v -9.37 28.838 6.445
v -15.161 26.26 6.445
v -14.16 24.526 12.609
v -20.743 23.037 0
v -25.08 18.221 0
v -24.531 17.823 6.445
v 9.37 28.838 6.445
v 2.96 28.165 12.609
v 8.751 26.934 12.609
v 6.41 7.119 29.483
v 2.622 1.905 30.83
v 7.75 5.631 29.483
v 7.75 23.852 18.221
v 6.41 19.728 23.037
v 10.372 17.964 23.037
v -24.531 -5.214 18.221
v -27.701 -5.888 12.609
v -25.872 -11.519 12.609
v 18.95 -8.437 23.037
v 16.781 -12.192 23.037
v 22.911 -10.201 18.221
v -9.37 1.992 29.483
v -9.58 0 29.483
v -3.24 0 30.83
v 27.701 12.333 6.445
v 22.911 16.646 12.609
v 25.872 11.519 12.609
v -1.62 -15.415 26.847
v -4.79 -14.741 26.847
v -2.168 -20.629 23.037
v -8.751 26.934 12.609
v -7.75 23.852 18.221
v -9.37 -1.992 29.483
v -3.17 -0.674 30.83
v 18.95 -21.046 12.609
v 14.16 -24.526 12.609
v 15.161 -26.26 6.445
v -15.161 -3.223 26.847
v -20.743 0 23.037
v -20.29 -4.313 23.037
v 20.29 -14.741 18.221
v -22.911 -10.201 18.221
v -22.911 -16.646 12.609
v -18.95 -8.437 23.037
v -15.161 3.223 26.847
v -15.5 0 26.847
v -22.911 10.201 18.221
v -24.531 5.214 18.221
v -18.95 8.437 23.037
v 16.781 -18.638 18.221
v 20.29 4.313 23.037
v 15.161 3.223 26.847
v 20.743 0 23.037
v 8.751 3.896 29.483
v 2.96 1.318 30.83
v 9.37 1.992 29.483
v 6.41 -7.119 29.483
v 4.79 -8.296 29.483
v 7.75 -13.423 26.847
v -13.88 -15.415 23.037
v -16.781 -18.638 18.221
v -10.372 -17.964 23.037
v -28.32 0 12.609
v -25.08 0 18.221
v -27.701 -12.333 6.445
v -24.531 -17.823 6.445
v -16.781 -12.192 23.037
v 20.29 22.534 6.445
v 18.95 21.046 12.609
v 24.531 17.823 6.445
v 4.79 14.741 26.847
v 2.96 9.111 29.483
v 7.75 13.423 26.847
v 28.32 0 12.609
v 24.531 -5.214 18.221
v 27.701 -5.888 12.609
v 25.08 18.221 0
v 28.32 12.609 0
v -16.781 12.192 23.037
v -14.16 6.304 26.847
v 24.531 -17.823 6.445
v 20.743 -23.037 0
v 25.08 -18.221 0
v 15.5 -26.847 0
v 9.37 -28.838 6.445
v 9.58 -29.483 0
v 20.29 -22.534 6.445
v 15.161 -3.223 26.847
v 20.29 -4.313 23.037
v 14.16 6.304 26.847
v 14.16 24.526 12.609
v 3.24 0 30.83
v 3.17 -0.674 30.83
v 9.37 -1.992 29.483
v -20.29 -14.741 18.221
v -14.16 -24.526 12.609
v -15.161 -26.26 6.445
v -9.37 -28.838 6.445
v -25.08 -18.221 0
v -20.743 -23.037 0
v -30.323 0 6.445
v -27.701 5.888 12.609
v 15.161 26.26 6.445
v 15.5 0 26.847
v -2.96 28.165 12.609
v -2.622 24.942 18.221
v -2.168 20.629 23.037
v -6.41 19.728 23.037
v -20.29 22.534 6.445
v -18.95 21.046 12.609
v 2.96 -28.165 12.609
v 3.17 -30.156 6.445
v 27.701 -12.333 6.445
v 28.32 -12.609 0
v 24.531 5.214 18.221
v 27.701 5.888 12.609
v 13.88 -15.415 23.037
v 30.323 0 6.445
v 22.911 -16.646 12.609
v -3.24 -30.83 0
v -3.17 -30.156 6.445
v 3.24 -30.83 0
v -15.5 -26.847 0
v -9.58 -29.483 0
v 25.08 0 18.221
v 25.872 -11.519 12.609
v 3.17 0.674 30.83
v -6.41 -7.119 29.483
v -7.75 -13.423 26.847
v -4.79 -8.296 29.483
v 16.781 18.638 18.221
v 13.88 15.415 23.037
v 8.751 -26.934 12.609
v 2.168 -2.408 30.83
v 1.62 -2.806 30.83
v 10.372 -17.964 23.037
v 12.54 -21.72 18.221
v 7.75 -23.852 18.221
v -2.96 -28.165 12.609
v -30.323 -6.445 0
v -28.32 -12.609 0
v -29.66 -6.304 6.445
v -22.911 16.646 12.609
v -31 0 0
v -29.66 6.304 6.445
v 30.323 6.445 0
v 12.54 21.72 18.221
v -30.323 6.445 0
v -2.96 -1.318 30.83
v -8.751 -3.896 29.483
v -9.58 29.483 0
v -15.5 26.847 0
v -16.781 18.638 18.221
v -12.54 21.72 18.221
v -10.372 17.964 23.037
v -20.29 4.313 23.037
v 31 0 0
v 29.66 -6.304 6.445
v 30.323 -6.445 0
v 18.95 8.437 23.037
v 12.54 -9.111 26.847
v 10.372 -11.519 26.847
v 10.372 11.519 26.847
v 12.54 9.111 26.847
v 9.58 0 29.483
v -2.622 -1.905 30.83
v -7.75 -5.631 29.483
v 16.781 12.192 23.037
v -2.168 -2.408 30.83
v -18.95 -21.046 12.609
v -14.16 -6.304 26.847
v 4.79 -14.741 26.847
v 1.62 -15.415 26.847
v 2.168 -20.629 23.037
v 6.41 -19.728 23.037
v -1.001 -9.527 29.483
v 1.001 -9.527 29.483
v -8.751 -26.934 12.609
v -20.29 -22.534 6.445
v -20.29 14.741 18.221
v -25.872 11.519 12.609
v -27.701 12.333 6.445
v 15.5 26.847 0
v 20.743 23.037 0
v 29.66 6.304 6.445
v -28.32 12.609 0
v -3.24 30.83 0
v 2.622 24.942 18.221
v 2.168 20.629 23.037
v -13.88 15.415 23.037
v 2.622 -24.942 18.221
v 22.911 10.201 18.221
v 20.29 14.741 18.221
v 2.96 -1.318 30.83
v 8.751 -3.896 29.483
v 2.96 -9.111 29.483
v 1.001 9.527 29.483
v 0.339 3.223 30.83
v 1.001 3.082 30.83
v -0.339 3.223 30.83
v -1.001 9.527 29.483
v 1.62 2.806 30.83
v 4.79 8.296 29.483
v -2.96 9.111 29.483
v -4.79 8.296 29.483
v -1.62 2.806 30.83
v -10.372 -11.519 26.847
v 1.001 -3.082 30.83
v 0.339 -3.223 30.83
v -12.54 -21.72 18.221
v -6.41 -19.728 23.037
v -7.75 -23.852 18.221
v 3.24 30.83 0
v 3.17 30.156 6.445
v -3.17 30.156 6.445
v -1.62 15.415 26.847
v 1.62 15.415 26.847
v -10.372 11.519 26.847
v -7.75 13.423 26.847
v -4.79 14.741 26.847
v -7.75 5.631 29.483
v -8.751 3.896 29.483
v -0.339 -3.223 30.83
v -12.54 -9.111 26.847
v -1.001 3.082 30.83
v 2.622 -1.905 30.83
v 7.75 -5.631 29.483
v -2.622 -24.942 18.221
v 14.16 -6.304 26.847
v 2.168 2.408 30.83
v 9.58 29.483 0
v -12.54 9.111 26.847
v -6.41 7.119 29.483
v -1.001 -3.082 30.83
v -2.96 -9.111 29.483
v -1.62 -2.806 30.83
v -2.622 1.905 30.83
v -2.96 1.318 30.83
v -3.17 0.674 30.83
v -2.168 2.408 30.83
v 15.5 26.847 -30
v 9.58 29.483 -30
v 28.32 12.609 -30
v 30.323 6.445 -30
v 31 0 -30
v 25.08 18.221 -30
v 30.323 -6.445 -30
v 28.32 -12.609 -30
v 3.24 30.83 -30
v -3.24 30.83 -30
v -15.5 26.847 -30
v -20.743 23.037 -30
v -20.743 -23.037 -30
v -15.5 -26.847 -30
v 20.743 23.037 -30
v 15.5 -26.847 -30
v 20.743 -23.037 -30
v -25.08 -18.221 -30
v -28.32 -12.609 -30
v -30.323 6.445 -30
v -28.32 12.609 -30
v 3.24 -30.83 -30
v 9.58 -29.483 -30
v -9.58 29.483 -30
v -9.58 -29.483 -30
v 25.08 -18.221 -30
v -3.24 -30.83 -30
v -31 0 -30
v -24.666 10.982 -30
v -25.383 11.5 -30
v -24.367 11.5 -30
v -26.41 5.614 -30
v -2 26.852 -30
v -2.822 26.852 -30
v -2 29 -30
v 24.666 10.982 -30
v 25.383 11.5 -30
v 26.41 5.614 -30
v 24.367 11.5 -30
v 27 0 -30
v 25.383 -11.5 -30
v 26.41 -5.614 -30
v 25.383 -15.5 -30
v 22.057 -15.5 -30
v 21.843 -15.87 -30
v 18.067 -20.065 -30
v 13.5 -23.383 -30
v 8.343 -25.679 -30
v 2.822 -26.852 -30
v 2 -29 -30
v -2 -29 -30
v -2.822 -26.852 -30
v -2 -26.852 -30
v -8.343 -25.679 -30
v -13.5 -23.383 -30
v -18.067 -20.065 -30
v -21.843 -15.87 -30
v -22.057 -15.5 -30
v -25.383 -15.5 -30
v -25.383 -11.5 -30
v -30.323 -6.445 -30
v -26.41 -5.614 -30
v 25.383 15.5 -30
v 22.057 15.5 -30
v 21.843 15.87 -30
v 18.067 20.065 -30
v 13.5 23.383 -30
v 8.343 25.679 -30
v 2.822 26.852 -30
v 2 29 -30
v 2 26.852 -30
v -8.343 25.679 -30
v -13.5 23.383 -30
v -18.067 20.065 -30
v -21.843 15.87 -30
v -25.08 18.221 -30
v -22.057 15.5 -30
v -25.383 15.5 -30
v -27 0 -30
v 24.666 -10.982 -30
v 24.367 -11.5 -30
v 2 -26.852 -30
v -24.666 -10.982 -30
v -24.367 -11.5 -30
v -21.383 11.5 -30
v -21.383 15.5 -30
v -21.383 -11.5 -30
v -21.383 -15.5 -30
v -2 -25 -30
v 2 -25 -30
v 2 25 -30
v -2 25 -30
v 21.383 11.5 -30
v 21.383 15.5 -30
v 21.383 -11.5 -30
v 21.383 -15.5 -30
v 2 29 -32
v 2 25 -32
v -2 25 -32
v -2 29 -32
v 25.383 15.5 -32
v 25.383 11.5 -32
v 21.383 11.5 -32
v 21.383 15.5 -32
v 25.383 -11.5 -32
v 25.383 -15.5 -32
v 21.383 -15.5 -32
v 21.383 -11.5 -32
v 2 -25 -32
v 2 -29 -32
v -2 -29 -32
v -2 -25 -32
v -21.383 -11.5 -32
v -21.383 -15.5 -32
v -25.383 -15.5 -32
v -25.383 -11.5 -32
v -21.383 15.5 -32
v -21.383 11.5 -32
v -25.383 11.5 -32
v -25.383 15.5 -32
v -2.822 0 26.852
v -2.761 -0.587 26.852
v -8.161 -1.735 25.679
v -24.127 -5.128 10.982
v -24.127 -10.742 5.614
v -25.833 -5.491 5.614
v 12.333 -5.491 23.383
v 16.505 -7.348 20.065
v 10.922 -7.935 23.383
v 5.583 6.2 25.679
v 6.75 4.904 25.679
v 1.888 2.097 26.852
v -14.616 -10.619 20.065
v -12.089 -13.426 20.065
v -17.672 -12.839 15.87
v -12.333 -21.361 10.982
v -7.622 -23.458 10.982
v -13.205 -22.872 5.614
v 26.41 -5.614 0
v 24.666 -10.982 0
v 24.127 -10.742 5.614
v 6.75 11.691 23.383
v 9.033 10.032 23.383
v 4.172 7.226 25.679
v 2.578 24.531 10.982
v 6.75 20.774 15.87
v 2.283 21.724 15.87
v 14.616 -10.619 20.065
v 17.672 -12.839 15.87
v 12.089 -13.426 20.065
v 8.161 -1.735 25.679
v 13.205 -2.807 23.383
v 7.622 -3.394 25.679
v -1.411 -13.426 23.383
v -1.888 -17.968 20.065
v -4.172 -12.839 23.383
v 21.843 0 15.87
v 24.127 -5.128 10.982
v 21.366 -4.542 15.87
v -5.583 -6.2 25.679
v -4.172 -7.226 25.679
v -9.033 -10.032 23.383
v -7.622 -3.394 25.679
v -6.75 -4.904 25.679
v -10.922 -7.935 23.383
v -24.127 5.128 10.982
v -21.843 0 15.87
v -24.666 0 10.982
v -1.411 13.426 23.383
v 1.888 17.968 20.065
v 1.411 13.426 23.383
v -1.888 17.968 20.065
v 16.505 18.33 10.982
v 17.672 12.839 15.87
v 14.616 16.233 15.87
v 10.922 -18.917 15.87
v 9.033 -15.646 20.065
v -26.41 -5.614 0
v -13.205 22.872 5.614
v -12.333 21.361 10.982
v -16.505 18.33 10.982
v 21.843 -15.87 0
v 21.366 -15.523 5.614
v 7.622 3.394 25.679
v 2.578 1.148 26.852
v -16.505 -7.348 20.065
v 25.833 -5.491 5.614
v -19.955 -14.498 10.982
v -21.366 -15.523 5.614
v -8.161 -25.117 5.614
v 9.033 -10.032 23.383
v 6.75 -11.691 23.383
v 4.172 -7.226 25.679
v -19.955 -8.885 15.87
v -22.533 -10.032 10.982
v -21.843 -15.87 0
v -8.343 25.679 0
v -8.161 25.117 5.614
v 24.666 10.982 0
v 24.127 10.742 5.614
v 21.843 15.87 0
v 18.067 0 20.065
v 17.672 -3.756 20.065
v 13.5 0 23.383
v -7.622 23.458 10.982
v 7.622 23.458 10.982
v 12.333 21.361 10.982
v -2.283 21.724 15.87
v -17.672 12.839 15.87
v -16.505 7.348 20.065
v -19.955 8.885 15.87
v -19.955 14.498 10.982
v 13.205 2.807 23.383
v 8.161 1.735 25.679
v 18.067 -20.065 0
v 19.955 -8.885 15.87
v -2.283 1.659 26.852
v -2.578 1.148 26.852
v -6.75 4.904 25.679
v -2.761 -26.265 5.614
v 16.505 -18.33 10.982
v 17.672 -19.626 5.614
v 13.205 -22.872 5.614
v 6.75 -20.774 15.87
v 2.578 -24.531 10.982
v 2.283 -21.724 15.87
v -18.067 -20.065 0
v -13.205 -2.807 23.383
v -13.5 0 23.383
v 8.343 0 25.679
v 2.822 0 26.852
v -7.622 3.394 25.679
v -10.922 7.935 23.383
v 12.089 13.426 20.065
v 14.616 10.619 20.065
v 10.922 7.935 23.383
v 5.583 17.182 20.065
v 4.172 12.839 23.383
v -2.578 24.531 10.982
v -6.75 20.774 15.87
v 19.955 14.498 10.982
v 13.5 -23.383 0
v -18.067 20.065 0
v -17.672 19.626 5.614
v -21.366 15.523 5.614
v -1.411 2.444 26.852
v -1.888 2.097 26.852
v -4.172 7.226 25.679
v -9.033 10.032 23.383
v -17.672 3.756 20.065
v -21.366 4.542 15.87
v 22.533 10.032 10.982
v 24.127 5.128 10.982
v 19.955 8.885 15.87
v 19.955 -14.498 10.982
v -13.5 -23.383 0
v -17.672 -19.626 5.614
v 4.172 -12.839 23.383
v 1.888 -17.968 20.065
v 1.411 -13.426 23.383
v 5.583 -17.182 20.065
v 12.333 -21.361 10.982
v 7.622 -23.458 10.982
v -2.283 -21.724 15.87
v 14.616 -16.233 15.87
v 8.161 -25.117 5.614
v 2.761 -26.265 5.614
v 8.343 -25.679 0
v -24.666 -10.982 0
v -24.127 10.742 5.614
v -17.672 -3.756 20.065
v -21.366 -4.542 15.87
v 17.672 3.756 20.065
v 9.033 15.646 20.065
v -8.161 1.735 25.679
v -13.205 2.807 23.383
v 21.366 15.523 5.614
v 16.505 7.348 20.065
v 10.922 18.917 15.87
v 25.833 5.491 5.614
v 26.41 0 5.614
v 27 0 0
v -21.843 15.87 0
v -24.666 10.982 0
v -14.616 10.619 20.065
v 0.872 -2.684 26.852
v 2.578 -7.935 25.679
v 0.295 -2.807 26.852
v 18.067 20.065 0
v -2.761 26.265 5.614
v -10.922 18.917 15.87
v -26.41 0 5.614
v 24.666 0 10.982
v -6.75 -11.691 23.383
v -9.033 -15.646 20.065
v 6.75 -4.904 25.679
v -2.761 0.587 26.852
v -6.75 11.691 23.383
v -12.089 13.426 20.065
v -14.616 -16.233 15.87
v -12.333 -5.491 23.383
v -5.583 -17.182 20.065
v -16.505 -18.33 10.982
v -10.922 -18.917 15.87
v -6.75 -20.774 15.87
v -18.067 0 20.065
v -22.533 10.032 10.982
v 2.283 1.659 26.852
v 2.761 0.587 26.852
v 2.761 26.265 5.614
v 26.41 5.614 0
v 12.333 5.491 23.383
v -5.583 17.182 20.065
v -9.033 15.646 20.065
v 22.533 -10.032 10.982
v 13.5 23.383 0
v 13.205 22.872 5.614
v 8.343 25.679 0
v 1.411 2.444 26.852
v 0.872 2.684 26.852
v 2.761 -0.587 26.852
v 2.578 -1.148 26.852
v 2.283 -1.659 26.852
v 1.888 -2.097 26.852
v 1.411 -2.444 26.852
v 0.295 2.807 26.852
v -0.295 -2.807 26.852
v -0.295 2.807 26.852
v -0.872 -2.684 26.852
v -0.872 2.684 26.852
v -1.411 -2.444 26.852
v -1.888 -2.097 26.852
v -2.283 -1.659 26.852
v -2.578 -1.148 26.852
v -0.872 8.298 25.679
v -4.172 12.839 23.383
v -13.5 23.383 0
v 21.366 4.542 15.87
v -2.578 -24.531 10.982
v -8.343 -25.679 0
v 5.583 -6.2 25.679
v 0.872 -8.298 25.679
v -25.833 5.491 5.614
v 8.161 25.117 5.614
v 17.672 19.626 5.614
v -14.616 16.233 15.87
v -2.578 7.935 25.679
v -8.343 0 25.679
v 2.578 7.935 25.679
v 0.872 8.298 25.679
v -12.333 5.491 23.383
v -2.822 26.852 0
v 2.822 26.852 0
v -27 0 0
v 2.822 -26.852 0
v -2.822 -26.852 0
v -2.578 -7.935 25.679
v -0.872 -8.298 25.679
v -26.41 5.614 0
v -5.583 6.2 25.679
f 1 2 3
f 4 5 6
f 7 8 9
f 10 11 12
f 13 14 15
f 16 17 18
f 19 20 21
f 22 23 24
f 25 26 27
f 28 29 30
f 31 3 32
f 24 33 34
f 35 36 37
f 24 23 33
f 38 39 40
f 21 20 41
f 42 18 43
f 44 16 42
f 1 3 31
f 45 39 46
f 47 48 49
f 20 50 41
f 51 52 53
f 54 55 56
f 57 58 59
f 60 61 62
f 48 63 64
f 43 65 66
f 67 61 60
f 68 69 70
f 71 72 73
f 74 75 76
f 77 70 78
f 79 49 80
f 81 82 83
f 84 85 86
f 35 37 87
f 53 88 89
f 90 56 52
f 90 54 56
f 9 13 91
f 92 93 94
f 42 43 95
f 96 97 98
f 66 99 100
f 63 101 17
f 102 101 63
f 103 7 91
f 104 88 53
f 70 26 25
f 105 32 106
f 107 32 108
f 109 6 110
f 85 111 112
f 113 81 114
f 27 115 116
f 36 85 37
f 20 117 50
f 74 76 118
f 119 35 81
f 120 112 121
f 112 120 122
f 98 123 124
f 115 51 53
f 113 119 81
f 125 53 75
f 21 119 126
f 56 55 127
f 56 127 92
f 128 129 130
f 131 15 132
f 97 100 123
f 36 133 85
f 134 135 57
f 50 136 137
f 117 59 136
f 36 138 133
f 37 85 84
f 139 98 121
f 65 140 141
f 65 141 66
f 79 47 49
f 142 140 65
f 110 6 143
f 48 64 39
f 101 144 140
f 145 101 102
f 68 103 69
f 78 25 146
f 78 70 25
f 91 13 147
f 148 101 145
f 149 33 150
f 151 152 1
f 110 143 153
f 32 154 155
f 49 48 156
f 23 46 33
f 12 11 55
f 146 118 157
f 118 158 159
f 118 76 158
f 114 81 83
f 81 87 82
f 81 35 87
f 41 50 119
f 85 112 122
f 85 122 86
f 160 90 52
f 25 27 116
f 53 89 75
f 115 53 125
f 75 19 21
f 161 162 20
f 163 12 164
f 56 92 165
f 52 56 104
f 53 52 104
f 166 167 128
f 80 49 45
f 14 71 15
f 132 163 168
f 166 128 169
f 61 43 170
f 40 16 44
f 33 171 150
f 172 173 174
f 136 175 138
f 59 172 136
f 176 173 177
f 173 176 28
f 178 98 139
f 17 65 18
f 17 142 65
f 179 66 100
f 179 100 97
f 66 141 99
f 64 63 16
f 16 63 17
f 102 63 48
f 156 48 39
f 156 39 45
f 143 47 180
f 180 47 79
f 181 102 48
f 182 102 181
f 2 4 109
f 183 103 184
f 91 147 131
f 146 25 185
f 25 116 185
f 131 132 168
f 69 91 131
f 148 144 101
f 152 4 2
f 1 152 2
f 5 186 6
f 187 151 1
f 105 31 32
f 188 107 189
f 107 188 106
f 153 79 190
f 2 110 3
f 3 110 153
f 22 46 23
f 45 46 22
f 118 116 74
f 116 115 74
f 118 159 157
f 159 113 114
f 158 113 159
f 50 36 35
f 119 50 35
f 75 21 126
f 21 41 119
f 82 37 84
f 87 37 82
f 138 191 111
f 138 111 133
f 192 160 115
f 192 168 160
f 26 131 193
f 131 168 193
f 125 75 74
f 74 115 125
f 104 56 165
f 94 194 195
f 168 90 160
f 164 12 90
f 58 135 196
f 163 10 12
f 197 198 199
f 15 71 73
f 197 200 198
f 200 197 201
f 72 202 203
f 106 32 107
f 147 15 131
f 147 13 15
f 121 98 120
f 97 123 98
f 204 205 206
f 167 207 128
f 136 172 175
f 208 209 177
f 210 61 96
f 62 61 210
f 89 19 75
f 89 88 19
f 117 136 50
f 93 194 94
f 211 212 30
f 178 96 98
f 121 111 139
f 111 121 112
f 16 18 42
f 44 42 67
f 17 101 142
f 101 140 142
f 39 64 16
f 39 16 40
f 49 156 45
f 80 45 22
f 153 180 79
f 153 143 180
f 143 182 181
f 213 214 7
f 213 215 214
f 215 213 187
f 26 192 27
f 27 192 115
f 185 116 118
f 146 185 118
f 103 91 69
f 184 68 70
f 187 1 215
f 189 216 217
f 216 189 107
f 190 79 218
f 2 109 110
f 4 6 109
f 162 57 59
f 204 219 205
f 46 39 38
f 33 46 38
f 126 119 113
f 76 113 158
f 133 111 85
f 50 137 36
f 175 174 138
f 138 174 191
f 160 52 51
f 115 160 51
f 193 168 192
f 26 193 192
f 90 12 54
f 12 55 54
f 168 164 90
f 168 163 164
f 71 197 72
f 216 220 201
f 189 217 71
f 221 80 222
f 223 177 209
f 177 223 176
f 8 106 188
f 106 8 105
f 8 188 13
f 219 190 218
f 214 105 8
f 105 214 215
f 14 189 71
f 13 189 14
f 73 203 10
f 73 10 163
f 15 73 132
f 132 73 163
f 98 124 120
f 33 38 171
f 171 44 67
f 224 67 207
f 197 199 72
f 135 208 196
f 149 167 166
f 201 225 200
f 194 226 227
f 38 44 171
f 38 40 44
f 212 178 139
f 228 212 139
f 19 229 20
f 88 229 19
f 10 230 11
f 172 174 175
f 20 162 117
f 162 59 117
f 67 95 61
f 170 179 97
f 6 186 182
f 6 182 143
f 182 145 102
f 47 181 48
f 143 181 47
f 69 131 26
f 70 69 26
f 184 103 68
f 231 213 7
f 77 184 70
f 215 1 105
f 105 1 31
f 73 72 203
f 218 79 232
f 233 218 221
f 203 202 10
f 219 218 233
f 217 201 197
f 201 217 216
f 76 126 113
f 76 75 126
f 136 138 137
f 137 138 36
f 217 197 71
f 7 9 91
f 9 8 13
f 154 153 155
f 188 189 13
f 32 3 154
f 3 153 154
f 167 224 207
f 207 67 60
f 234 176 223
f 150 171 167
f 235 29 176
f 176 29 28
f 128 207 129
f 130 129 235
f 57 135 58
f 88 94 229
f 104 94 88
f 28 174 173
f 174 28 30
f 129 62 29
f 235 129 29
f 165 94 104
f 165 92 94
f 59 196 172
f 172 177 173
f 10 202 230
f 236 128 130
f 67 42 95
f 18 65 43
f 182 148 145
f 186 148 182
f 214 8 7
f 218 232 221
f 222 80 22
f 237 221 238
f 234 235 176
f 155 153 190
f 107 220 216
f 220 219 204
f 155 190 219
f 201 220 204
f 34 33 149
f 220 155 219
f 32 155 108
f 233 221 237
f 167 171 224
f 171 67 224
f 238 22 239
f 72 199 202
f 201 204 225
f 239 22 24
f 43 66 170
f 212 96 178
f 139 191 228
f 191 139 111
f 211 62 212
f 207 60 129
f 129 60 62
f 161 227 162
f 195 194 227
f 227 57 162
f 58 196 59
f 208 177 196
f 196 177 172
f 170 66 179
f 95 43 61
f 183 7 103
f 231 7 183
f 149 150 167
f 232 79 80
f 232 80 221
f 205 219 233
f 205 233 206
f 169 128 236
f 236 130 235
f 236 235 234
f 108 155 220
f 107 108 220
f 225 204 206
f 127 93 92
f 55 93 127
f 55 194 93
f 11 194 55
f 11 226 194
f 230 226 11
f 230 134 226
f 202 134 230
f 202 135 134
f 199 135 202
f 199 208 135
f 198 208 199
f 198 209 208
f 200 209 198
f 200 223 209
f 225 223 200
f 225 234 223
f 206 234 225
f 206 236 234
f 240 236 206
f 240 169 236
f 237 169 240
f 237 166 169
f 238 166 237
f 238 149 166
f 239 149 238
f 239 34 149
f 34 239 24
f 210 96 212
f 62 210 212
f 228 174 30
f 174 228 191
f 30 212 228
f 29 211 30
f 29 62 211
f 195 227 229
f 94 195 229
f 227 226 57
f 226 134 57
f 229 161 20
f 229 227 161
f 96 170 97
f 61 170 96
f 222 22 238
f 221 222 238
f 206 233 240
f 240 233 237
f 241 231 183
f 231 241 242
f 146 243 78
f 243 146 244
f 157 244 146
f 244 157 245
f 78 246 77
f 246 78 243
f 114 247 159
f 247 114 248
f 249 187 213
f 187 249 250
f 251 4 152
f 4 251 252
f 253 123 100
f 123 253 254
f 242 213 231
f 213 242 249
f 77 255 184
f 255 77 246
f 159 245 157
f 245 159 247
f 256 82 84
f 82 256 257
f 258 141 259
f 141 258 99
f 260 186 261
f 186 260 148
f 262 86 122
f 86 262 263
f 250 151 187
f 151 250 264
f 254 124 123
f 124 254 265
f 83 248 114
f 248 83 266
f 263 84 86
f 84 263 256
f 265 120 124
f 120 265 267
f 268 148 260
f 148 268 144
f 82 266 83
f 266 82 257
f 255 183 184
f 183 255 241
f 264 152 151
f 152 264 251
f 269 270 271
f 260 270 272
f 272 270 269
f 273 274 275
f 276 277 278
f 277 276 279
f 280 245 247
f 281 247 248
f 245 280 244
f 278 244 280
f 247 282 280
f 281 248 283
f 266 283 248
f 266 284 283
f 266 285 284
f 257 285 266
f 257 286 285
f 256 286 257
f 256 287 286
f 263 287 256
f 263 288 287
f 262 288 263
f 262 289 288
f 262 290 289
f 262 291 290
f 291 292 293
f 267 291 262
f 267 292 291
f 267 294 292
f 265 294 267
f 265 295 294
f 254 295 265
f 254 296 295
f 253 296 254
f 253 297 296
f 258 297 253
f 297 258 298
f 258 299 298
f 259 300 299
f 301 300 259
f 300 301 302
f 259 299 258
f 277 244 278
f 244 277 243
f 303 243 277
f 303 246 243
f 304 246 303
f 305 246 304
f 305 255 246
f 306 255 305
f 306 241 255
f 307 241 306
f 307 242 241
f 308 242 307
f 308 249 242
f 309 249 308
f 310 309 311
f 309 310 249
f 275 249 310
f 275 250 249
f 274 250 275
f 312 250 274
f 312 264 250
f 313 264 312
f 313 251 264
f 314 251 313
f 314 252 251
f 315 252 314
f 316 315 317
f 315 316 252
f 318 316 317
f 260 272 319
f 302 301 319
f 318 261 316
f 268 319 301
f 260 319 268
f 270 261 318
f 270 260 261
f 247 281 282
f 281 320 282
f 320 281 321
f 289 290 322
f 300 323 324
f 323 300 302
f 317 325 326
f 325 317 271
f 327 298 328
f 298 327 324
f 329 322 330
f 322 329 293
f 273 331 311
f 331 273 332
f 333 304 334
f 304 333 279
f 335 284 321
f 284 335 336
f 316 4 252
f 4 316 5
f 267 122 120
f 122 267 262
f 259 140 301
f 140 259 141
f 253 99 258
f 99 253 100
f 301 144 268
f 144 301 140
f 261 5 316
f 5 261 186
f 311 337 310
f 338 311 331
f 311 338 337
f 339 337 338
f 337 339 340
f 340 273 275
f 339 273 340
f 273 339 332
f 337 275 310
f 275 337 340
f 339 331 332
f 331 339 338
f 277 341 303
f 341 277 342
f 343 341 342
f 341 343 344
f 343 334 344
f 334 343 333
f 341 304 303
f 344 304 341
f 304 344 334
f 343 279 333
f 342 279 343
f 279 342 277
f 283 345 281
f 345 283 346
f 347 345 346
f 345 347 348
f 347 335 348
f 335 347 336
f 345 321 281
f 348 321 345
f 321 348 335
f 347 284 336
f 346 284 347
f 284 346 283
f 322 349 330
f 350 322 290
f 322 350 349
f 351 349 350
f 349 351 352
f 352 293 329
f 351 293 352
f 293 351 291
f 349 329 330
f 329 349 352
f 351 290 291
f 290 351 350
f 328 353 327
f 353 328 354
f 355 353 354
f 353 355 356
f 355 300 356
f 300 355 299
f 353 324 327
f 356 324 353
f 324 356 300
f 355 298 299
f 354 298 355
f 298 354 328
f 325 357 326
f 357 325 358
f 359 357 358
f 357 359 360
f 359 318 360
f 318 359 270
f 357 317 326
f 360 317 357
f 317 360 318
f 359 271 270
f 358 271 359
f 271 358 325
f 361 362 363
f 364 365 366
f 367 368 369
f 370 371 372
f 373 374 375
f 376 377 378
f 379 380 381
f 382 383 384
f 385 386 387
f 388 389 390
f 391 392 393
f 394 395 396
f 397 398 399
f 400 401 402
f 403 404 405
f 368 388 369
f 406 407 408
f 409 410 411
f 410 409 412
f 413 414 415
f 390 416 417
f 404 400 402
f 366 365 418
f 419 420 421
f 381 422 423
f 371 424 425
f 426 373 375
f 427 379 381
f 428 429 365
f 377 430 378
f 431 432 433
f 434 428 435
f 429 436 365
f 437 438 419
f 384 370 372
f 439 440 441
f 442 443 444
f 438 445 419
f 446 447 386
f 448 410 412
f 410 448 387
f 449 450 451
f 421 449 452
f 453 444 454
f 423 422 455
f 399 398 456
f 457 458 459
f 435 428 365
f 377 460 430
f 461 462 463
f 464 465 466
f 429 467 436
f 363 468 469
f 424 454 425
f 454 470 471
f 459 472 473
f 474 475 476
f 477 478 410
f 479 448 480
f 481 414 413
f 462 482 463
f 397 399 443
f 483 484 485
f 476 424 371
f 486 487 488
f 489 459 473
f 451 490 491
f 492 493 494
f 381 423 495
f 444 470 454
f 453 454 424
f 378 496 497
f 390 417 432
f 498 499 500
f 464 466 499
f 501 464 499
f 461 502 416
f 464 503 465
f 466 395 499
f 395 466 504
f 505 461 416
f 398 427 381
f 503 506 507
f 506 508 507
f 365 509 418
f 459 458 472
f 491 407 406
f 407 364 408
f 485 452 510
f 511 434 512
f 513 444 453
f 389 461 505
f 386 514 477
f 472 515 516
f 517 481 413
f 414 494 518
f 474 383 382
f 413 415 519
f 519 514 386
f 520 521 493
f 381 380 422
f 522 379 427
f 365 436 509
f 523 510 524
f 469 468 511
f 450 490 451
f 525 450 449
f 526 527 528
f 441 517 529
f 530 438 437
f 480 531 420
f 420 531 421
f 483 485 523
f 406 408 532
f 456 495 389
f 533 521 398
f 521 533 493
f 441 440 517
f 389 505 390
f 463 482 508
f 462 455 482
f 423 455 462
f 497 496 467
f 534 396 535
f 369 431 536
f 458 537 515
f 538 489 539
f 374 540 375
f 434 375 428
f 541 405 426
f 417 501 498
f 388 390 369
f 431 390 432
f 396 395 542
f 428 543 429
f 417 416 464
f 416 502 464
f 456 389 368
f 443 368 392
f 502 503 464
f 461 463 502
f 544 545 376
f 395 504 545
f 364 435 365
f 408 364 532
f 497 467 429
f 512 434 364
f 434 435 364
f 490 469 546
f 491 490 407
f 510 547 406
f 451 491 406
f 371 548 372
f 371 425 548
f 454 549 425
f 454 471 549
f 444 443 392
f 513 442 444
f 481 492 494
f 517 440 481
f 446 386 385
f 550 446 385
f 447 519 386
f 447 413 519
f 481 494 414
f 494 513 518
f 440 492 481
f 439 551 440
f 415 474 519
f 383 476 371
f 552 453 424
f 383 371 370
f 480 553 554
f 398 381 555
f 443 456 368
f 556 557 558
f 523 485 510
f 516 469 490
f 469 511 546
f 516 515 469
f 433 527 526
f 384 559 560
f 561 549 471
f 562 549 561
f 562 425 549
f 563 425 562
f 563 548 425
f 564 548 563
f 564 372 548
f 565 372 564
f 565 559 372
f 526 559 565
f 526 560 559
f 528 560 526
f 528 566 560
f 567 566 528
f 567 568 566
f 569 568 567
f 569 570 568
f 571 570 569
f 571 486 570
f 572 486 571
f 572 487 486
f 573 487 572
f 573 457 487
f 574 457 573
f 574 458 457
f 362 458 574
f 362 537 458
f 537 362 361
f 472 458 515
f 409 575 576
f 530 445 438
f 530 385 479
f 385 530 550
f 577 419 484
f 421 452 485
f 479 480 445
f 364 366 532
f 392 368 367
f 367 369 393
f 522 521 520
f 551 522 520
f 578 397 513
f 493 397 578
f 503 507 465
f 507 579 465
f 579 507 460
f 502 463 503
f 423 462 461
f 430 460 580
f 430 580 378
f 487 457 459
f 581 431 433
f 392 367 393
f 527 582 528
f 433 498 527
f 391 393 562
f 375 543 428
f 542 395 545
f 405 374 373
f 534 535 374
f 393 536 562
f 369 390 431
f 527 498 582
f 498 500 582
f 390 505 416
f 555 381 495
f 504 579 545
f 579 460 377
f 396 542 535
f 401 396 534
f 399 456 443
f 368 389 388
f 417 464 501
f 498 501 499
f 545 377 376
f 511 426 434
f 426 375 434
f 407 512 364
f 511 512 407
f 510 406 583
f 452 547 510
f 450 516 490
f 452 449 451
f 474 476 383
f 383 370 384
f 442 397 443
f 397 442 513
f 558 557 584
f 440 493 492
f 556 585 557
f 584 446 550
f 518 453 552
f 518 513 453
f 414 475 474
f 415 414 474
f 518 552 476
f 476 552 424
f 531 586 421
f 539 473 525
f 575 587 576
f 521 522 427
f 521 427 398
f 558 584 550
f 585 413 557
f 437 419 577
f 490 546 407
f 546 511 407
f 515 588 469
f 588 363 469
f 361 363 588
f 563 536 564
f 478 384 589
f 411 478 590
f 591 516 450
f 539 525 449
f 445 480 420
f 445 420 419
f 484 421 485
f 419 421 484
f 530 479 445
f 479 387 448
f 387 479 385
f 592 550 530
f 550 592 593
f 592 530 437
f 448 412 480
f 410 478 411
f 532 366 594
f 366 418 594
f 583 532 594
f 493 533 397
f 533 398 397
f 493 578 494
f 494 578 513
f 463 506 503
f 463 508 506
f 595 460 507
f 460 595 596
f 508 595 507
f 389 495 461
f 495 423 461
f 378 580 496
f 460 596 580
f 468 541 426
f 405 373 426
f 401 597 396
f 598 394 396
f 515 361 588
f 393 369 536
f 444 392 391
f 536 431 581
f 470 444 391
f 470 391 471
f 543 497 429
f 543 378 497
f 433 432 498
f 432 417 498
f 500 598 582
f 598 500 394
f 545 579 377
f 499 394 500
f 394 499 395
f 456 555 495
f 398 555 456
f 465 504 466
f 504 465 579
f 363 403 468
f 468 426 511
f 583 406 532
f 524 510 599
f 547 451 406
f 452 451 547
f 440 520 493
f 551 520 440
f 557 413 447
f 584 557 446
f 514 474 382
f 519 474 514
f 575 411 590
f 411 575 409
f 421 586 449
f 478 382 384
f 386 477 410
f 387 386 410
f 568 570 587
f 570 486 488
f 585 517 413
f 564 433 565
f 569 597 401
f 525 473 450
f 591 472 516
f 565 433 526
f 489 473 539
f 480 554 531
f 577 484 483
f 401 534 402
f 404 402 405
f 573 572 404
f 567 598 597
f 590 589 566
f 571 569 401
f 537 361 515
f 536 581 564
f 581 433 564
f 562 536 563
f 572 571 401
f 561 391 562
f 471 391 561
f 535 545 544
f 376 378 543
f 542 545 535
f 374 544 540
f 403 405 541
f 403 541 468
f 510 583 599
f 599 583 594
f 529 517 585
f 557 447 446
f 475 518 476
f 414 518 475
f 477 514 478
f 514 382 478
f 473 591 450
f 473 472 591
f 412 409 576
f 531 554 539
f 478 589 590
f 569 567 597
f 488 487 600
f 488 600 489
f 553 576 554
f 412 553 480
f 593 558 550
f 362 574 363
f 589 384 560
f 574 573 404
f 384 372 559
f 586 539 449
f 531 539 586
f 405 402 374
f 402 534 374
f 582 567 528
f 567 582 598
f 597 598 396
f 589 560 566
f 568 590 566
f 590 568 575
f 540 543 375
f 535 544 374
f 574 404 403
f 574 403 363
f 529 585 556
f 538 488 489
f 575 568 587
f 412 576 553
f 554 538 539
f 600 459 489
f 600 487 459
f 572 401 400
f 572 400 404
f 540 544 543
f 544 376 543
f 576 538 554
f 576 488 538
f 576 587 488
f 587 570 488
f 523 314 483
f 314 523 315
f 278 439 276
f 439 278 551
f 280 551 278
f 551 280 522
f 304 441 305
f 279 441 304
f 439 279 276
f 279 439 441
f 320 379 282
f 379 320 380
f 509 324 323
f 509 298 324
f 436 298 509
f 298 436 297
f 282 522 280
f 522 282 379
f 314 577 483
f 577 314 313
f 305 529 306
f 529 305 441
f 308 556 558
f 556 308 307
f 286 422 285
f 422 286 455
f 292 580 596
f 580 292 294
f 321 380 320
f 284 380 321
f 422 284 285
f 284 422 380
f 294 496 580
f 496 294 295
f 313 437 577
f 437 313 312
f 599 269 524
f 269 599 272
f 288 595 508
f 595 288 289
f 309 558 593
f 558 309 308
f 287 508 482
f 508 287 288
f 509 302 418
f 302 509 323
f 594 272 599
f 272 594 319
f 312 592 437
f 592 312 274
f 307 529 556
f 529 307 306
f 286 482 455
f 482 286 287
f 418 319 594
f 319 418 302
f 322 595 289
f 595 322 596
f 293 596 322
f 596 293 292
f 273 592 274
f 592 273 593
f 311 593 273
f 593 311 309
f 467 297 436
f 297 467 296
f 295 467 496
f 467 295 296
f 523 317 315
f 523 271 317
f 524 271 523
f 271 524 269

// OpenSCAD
module inside_sphere(r,h)
{
/**/
  difference()
  {
    sphere(r);
    translate([0, 0, -r]) cube(r*2, center=true);
  }//diff
/**/
  translate([0, 0, -h/2])
			cylinder(h=h, r=r, center = true);
/**/
}

module outside_sphere(t,r,h)
{
  inside_sphere(r+t,h);
  for (i = [0:5])
  {
    translate([r*sin(360*i/6), r*cos(360*i/6), -h])
      cube(t, center=true);
  }
}

module nut_sphere(t,r,h)
{
  difference()
  {
    outside_sphere(t,r,h);
    inside_sphere(r,h);
  }//diff
}

r=54/2;
h=30;
t=4;
nut_sphere(t,r,h);
